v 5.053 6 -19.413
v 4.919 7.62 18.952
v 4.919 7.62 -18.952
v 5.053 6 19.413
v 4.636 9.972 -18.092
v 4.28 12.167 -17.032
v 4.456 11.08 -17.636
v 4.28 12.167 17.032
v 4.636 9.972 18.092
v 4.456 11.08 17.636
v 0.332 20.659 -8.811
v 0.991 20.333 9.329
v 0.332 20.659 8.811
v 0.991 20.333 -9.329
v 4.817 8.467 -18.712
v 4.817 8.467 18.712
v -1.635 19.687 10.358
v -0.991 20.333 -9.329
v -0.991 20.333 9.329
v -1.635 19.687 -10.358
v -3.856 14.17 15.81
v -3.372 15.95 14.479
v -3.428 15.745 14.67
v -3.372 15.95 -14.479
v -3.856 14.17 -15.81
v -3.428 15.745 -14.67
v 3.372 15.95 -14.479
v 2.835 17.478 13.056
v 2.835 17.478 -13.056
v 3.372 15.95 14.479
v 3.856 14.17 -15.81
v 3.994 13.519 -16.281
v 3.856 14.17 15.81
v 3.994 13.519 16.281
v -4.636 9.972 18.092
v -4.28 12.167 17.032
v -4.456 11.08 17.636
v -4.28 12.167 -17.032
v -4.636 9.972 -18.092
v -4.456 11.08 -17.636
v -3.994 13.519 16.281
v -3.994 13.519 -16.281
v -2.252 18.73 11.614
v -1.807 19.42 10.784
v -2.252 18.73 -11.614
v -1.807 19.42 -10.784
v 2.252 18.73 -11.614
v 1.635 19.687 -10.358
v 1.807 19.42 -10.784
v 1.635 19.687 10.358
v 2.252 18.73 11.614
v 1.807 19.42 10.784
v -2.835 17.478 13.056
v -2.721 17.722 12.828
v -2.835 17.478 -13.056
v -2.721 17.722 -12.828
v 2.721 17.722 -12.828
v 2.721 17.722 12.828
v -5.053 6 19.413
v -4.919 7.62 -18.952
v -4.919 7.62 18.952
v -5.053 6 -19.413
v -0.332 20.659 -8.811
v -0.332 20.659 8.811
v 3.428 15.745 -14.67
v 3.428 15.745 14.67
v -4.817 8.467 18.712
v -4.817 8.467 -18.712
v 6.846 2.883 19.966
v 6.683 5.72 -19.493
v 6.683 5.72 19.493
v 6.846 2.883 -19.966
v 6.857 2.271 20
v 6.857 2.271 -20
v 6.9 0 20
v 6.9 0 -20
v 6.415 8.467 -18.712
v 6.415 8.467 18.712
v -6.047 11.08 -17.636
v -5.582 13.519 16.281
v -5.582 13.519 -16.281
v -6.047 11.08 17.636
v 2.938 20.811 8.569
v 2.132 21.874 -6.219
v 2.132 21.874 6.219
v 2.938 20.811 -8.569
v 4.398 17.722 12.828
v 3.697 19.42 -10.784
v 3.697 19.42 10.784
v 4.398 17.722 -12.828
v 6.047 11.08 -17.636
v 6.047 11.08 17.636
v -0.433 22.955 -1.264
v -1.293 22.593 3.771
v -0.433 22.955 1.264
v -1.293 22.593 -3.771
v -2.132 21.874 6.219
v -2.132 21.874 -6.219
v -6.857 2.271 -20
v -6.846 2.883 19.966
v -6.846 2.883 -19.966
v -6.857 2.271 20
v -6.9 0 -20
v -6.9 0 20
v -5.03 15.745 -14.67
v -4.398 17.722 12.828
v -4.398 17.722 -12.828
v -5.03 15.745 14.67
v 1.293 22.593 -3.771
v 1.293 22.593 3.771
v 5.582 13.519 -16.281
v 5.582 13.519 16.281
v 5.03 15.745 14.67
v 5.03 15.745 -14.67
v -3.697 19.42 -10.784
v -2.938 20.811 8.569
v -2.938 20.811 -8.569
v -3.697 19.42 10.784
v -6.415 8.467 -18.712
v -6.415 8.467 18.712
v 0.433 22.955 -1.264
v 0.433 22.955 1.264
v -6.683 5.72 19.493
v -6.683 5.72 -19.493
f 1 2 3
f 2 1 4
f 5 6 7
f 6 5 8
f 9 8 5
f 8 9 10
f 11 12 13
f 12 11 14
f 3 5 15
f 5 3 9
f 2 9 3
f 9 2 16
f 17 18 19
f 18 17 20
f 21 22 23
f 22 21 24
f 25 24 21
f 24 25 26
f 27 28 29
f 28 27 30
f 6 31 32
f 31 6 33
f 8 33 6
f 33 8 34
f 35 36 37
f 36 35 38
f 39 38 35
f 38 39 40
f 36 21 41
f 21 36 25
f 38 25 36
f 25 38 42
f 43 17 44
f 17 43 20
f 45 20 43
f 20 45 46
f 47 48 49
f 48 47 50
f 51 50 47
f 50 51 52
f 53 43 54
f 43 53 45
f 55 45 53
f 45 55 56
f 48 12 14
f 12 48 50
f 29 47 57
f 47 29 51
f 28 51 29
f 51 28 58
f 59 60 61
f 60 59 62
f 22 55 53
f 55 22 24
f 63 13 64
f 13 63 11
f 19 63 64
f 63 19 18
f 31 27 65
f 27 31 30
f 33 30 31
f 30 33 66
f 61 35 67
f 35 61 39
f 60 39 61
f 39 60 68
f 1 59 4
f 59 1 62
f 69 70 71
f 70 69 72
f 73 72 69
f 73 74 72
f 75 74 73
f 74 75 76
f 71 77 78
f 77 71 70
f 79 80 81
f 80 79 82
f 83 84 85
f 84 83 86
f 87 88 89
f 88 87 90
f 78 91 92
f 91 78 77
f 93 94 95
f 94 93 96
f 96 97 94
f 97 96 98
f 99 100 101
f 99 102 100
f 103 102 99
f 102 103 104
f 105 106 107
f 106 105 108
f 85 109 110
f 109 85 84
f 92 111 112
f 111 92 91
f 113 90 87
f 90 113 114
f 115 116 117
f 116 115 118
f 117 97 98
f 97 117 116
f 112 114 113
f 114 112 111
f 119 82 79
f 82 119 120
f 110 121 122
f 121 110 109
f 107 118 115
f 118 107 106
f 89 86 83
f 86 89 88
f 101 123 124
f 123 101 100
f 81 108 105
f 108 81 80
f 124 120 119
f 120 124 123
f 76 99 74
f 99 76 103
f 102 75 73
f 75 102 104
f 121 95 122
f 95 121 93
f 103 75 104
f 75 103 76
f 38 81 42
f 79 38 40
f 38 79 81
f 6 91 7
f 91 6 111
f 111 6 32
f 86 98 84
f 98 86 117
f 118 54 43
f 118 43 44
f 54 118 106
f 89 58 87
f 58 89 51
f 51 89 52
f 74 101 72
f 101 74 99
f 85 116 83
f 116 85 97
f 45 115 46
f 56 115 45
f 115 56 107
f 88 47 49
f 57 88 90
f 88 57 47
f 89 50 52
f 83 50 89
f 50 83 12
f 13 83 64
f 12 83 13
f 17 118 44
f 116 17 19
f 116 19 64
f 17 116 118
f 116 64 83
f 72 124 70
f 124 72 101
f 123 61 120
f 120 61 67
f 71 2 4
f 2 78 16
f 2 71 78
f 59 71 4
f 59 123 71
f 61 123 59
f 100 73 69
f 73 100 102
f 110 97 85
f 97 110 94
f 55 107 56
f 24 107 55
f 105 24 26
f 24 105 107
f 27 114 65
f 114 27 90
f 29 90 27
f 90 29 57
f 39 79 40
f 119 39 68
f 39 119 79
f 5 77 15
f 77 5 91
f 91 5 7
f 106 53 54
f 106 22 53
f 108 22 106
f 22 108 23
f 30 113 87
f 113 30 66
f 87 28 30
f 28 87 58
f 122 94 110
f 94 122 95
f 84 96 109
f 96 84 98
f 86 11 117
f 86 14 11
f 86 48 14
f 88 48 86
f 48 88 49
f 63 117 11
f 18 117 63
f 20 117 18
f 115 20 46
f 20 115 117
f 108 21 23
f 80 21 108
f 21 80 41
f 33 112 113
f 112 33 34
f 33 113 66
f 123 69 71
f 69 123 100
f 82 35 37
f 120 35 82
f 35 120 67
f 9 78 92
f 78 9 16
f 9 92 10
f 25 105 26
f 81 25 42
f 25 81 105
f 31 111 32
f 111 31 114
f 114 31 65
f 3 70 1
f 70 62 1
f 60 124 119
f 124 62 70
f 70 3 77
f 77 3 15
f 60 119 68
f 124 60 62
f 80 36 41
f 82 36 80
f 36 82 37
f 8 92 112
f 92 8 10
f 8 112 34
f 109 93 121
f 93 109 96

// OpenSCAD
// file: ../../../gospel.scad
/**
 * GOSPEL: George's OpenSCAD Procedural Enhancement Library
 * @author glaza
 *
 * Index:
 *      Translation: x, y, z, xy, xz, yz, xyz (displacement, variation)
 *      Scaling:     sx, sy, sz, sxy, sxz, syz, s (factor, variation)
 *      Rotation:    rx, ry, rz (angle, variation)
 *      Duplication: dx, dy, dz ()
 */
use <3rd_party/threads-library-by-cuiso-v1.scad>

/**
 * Translates the children in the X,Y,Z direction
 * @param d Displacement in X,Y,Z direction
 * @param variation The random variation + or - added to the displacement * 
 *  x      Translate X
 *  y      Translate Y
 *  z      Translate Z
 *  xy     Translate equaly in X and Y
 *  xz     Translate equaly in X and Z
 *  yz     Translate equaly in Y and Z
 *  xyz    Translate equaly in X, Y and Z
 */
function rand(value, variation=0) = value + rands(-variation,variation,1)[0]; 
 
module x(dx, variation=0) 
{   
    vx = rands(-variation,variation,1)[0];
    translate([dx+vx,0,0])
    children();
}
module y(dy, variation=0) 
{   
    vy = rands(-variation,variation,1)[0];
    translate([0,dy+vy,0])
    children();
} 
module z(dz, variation=0) 
{   
    vz = rands(-variation,variation,1)[0];
    translate([0,0,dz+vz])
    children();
}
module xy(d, variation=0) 
{   
    x(d, variation)
    y(d, variation)
    children();
}
module yz(d, variation=0) 
{   
    z(d, variation)
    y(d, variation)
    children();
}
module xz(d, variation=0) 
{   
    x(d, variation)
    z(d, variation)
    children();
}
module xyz(d, variation=0) 
{   
    xy(d, variation)
    z(d, variation)
    children();
}

/**
 * Rotates the children around the X axis
 * @param angle Degrees to rotate around the X axis
 * @param variation The random variation + or - added
 *  rx     Rotate around X
 *  ry     Rotate around Y
 *  rz     Rotate around Z
 */
module rx(angle, variation=0) 
{   
    v = rands(-variation,variation,1)[0];
    rotate([angle+v,0,0])
    children();
}
module ry(angle, variation=0) 
{   
    v = rands(-variation,variation,1)[0];
    rotate([0,angle+v,0])
    children();
}
module rz(angle, variation=0) 
{   
    v = rands(-variation,variation,1)[0];
    rotate([0,0,angle+v])
    children();
}

/**
 * Duplicates the children across the different planes.
 *      dx: YZ plane, dy: XZ plane, dz: XY plane
 */
module dx() 
{
    mirror([1,0,0])
    children();

    children();
}
module dy() 
{
    mirror([0,1,0])
    children();

    children();
}
module dz() 
{
    mirror([0,0,1])
    children();

    children();
}

/**
 * Mirrors across diferent planes.
 *      mx: YZ plane, my: XZ plane, mz: XY plane
 */
module mx() 
{
    mirror([1,0,0])
    children();
}
module my() 
{
    mirror([0,1,0])
    children();
}
module mz() 
{
    mirror([0,0,1])
    children();
}

/**
 * Scales in different directions
 *      mx: YZ plane, my: XZ plane, mz: XY plane
 */
module sx(factor, variation=0) 
{
    scaleFactor = rand(factor, variation);
    scale([scaleFactor,1,1])
    children();
}
module sy(factor, variation=0) 
{
    scaleFactor = rand(factor, variation);
    scale([1,scaleFactor,1])
    children();
}
module sz(factor, variation=0) 
{
    scaleFactor = rand(factor, variation);
    scale([1,1,scaleFactor])
    children();
}
module sxy(factor, variation=0) 
{
    sx(factor, variation)
    sy(factor, variation)
    children();
}
module syz(factor, variation=0) 
{
    sz(factor, variation)
    sy(factor, variation)
    children();
}
module sxz(factor, variation=0) 
{   
    sx(factor, variation)
    sz(factor, variation)
    children();
}
module s(factor, variation=0) 
{   
    sxy(factor, variation)
    sz(factor, variation)
    children();
}

/**
 * Shortcuts
 */
module diff() //does not work
{
    difference()
    {
        children();
    }
}


/**
 * Colours
 */
module red()     { color("Red") children(); }
module blue()    { color("RoyalBlue") children(); }
module green()   { color("Green") children(); }
module black()   { color("Black") children(); }
module white()   { color("White") children(); }
module cyan()    { color("Cyan") children(); }
module magenta() { color("Magenta") children(); }
module yellow()  { color("Yellow") children(); }
module glass()   { color([0.5, 0.5, 1], 0.25) children(); }

/**
 * shapes
 * @param size A vector passed to the cube
 * @param r The radius of the sphere
 * @param half Whether all corners or only top ones
 */
module rounded(size, r, half)
{
    radius = half
        ? min(r, 0.999*min(size[0]/2, size[1]/2, size[2]))
        : min(r, 0.999*min(size)/2);
    
    diameter = 2*radius;
    width = size[0] - diameter;
    height = size[1] - diameter;
    depth = half 
        ? (size[2] - radius) 
        : size[2] - diameter;
    shift = half ? radius : 0; 
    
    intersection()
    {
        z(-shift)
        xyz(radius)
        minkowski()
        {
            sphere(radius);
            cube([width,height,depth]);
        }
        
        cube(size);
    }
}

module screw(d, h, center=false) {
    z(center ? -h : 0)
    thread_for_screw(diameter=d - 1, length=h);
}

module thread(d, h, center=false) {
    z(center ? -h : 0)
    thread_for_nut(diameter=d, length=h); 
}
// main file
use <../../../gospel.scad>

$fn = 50;
HEIGHT = 40;
RADIUS = 23;
MAGNET_HEIGHT = 4;
MAGNET_DIAMETER = 11;
MAGNET_MARGIN = 7;
MAGNET_DEPTH = 1;
SCREW_DIAMETER = 10;
SCREW_HEIGHT = 12;

#body();


dz()
y(MAGNET_HEIGHT/2+MAGNET_DEPTH)
z(HEIGHT/2-MAGNET_MARGIN) rx(90)
magnet();

module body() {
    intersection() {
        difference() {
            sx(0.3)
            cylinder(h=HEIGHT, r=RADIUS, center=true);

            // Half
            y(-50) cube([100,100,HEIGHT*1.1], center=true);

            // Hole
            intersection() {
                sy(0.90) sx(0.23)
                cylinder(h=HEIGHT*1.001, r=RADIUS, center=true);
                
                y(MAGNET_HEIGHT + 2*MAGNET_DEPTH)
                y(50) cube([100,100,HEIGHT*1.1], center=true);
            }
      
            // Magnets
            dz()
            y(MAGNET_HEIGHT/2+MAGNET_DEPTH)
            z(HEIGHT/2-MAGNET_MARGIN) rx(90)
            magnet();
        }
        
        sz(0.875) ry(90)
        cylinder(h=HEIGHT, r=RADIUS, center=true);
    }
}

module magnet() {
    cylinder(h=MAGNET_HEIGHT, d=MAGNET_DIAMETER, center=true);
}
